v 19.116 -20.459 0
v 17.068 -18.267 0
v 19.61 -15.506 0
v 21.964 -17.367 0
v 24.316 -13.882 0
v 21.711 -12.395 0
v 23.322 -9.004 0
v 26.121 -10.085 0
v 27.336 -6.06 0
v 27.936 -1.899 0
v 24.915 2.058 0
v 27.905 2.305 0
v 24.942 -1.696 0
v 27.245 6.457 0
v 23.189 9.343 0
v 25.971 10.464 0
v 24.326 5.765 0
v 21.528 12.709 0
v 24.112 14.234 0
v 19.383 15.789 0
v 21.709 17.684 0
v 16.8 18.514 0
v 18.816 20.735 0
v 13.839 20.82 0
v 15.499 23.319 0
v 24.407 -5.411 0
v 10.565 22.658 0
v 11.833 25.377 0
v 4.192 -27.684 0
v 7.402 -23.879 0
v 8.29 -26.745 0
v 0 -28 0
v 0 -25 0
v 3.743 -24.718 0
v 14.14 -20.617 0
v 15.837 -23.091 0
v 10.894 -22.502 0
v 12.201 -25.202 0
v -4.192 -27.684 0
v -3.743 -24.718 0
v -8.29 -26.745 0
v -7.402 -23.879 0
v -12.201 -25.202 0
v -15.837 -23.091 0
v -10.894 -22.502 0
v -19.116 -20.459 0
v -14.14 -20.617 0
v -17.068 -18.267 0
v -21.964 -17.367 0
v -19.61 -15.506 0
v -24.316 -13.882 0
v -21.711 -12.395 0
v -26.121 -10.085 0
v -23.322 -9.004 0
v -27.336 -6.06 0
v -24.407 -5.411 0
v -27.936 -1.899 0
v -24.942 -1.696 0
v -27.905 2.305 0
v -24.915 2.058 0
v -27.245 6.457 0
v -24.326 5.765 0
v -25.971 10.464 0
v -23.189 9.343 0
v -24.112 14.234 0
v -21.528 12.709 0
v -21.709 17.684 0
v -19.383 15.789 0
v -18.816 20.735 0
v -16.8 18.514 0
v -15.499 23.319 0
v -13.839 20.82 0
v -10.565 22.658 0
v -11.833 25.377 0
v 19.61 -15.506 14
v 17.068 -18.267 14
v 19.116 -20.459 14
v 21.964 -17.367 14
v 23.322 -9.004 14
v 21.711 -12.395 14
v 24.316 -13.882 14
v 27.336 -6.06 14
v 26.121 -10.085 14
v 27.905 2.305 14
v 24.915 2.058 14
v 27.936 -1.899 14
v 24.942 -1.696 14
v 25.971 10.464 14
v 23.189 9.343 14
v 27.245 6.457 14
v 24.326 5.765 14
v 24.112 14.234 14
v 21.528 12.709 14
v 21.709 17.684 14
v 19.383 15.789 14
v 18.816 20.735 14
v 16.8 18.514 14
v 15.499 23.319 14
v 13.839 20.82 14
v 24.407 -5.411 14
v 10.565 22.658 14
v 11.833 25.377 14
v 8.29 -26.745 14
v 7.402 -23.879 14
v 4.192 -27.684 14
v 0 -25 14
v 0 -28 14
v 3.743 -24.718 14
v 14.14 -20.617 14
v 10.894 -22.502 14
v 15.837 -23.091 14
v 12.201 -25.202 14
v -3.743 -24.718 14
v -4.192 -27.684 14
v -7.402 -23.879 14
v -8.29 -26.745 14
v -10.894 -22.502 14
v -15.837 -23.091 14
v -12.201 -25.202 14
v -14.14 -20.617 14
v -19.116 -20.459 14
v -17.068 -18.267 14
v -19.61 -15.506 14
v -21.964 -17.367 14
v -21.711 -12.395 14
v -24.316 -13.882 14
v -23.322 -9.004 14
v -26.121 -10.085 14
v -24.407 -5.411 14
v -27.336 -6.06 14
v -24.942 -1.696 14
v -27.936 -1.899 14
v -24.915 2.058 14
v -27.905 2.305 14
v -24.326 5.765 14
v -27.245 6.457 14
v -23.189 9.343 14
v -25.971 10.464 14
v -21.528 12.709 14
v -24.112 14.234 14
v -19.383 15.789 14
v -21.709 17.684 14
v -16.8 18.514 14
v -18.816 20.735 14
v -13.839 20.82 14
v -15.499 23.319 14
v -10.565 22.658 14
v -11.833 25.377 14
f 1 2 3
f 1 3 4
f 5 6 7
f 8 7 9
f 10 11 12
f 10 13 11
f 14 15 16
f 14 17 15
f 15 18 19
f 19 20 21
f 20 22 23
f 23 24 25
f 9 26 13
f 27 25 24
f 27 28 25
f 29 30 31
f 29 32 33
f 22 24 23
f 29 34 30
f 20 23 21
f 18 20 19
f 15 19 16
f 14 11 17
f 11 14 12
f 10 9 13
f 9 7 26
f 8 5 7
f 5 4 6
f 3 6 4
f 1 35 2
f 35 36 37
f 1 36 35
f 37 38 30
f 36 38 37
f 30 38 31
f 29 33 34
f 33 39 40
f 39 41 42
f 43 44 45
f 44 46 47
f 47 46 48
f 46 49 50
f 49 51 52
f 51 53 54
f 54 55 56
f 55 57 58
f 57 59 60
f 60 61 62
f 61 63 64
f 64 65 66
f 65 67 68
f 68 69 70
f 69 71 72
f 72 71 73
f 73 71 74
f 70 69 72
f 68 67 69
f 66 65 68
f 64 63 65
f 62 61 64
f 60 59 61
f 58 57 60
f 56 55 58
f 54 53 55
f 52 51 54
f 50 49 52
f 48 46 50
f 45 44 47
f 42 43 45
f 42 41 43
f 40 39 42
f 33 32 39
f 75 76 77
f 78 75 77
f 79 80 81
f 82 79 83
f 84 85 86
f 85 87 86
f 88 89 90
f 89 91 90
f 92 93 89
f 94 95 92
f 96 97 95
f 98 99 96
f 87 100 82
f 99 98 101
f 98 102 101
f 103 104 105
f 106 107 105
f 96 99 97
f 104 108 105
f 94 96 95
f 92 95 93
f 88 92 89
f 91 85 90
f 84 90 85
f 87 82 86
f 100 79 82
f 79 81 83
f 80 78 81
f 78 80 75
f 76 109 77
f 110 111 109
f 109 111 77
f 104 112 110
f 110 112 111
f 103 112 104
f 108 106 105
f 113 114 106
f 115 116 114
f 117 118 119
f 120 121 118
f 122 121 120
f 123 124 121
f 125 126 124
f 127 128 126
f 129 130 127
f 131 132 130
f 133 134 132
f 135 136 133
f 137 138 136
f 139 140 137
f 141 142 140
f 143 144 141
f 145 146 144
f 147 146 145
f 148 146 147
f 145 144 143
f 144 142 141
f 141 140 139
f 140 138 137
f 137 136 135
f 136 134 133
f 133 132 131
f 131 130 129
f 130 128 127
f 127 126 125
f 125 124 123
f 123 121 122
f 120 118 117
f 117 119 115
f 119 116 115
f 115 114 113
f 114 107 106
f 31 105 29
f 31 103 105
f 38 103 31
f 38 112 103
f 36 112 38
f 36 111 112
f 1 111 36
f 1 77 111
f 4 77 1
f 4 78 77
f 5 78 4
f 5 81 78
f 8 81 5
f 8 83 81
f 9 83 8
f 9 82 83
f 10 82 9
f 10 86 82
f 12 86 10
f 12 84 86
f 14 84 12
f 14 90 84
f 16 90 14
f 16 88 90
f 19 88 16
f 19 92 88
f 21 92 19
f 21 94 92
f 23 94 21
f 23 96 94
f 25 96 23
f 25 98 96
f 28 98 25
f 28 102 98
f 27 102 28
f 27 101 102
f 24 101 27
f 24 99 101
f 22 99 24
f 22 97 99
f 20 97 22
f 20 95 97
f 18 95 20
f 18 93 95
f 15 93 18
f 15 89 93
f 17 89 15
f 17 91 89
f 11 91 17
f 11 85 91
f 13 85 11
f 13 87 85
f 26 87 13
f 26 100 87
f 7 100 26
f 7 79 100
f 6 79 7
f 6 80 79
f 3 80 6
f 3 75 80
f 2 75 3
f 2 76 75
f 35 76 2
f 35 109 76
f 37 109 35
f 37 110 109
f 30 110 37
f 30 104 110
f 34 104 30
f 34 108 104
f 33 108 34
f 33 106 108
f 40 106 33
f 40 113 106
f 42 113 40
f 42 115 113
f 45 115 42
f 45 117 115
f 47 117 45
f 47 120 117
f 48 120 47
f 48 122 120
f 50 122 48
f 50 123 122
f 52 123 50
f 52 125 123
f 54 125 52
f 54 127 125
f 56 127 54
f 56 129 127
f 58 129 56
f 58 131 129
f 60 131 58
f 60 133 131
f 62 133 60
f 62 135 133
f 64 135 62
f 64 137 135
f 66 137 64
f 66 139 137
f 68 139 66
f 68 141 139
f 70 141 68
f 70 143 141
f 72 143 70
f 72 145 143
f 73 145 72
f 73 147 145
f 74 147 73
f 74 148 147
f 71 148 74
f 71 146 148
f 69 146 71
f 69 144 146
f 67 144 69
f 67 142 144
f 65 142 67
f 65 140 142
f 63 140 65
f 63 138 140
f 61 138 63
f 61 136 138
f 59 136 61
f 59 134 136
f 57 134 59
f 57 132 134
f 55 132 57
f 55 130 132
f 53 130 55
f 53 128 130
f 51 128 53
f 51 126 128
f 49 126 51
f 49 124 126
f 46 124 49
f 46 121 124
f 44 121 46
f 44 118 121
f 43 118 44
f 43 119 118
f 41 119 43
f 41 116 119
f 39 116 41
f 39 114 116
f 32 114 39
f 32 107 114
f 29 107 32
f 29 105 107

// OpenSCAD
$fn = 32;

// ----------------------------------------------------------------------
// Spring clip: 56 mm outside, 3 mm band, 50 degree opening
// ----------------------------------------------------------------------

// --- parameters (mm) ---
outer_r = 28;             // clip outside radius
inner_r = 25;             // clip bore radius
band = 3;                 // band thickness
clip_w = 14;              // clip width
opening = 50;             // opening angle

clip_profile = [[-11.833, 25.377], [-15.499, 23.319], [-18.816, 20.735], [-21.709, 17.684], [-24.112, 14.234], [-25.971, 10.464], [-27.245, 6.457], [-27.905, 2.305], [-27.936, -1.899], [-27.336, -6.06], [-26.121, -10.085], [-24.316, -13.882], [-21.964, -17.367], [-19.116, -20.459], [-15.837, -23.091], [-12.201, -25.202], [-8.29, -26.745], [-4.192, -27.684], [0, -28], [4.192, -27.684], [8.29, -26.745], [12.201, -25.202], [15.837, -23.091], [19.116, -20.459], [21.964, -17.367], [24.316, -13.882], [26.121, -10.085], [27.336, -6.06], [27.936, -1.899], [27.905, 2.305], [27.245, 6.457], [25.971, 10.464], [24.112, 14.234], [21.709, 17.684], [18.816, 20.735], [15.499, 23.319], [11.833, 25.377], [10.565, 22.658], [13.839, 20.82], [16.8, 18.514], [19.383, 15.789], [21.528, 12.709], [23.189, 9.343], [24.326, 5.765], [24.915, 2.058], [24.942, -1.696], [24.407, -5.411], [23.322, -9.004], [21.711, -12.395], [19.61, -15.506], [17.068, -18.267], [14.14, -20.617], [10.894, -22.502], [7.402, -23.879], [3.743, -24.718], [0, -25], [-3.743, -24.718], [-7.402, -23.879], [-10.894, -22.502], [-14.14, -20.617], [-17.068, -18.267], [-19.61, -15.506], [-21.711, -12.395], [-23.322, -9.004], [-24.407, -5.411], [-24.942, -1.696], [-24.915, 2.058], [-24.326, 5.765], [-23.189, 9.343], [-21.528, 12.709], [-19.383, 15.789], [-16.8, 18.514], [-13.839, 20.82], [-10.565, 22.658]];

difference() {
  union() {
    linear_extrude(height = clip_w) polygon(clip_profile);
  }
}
